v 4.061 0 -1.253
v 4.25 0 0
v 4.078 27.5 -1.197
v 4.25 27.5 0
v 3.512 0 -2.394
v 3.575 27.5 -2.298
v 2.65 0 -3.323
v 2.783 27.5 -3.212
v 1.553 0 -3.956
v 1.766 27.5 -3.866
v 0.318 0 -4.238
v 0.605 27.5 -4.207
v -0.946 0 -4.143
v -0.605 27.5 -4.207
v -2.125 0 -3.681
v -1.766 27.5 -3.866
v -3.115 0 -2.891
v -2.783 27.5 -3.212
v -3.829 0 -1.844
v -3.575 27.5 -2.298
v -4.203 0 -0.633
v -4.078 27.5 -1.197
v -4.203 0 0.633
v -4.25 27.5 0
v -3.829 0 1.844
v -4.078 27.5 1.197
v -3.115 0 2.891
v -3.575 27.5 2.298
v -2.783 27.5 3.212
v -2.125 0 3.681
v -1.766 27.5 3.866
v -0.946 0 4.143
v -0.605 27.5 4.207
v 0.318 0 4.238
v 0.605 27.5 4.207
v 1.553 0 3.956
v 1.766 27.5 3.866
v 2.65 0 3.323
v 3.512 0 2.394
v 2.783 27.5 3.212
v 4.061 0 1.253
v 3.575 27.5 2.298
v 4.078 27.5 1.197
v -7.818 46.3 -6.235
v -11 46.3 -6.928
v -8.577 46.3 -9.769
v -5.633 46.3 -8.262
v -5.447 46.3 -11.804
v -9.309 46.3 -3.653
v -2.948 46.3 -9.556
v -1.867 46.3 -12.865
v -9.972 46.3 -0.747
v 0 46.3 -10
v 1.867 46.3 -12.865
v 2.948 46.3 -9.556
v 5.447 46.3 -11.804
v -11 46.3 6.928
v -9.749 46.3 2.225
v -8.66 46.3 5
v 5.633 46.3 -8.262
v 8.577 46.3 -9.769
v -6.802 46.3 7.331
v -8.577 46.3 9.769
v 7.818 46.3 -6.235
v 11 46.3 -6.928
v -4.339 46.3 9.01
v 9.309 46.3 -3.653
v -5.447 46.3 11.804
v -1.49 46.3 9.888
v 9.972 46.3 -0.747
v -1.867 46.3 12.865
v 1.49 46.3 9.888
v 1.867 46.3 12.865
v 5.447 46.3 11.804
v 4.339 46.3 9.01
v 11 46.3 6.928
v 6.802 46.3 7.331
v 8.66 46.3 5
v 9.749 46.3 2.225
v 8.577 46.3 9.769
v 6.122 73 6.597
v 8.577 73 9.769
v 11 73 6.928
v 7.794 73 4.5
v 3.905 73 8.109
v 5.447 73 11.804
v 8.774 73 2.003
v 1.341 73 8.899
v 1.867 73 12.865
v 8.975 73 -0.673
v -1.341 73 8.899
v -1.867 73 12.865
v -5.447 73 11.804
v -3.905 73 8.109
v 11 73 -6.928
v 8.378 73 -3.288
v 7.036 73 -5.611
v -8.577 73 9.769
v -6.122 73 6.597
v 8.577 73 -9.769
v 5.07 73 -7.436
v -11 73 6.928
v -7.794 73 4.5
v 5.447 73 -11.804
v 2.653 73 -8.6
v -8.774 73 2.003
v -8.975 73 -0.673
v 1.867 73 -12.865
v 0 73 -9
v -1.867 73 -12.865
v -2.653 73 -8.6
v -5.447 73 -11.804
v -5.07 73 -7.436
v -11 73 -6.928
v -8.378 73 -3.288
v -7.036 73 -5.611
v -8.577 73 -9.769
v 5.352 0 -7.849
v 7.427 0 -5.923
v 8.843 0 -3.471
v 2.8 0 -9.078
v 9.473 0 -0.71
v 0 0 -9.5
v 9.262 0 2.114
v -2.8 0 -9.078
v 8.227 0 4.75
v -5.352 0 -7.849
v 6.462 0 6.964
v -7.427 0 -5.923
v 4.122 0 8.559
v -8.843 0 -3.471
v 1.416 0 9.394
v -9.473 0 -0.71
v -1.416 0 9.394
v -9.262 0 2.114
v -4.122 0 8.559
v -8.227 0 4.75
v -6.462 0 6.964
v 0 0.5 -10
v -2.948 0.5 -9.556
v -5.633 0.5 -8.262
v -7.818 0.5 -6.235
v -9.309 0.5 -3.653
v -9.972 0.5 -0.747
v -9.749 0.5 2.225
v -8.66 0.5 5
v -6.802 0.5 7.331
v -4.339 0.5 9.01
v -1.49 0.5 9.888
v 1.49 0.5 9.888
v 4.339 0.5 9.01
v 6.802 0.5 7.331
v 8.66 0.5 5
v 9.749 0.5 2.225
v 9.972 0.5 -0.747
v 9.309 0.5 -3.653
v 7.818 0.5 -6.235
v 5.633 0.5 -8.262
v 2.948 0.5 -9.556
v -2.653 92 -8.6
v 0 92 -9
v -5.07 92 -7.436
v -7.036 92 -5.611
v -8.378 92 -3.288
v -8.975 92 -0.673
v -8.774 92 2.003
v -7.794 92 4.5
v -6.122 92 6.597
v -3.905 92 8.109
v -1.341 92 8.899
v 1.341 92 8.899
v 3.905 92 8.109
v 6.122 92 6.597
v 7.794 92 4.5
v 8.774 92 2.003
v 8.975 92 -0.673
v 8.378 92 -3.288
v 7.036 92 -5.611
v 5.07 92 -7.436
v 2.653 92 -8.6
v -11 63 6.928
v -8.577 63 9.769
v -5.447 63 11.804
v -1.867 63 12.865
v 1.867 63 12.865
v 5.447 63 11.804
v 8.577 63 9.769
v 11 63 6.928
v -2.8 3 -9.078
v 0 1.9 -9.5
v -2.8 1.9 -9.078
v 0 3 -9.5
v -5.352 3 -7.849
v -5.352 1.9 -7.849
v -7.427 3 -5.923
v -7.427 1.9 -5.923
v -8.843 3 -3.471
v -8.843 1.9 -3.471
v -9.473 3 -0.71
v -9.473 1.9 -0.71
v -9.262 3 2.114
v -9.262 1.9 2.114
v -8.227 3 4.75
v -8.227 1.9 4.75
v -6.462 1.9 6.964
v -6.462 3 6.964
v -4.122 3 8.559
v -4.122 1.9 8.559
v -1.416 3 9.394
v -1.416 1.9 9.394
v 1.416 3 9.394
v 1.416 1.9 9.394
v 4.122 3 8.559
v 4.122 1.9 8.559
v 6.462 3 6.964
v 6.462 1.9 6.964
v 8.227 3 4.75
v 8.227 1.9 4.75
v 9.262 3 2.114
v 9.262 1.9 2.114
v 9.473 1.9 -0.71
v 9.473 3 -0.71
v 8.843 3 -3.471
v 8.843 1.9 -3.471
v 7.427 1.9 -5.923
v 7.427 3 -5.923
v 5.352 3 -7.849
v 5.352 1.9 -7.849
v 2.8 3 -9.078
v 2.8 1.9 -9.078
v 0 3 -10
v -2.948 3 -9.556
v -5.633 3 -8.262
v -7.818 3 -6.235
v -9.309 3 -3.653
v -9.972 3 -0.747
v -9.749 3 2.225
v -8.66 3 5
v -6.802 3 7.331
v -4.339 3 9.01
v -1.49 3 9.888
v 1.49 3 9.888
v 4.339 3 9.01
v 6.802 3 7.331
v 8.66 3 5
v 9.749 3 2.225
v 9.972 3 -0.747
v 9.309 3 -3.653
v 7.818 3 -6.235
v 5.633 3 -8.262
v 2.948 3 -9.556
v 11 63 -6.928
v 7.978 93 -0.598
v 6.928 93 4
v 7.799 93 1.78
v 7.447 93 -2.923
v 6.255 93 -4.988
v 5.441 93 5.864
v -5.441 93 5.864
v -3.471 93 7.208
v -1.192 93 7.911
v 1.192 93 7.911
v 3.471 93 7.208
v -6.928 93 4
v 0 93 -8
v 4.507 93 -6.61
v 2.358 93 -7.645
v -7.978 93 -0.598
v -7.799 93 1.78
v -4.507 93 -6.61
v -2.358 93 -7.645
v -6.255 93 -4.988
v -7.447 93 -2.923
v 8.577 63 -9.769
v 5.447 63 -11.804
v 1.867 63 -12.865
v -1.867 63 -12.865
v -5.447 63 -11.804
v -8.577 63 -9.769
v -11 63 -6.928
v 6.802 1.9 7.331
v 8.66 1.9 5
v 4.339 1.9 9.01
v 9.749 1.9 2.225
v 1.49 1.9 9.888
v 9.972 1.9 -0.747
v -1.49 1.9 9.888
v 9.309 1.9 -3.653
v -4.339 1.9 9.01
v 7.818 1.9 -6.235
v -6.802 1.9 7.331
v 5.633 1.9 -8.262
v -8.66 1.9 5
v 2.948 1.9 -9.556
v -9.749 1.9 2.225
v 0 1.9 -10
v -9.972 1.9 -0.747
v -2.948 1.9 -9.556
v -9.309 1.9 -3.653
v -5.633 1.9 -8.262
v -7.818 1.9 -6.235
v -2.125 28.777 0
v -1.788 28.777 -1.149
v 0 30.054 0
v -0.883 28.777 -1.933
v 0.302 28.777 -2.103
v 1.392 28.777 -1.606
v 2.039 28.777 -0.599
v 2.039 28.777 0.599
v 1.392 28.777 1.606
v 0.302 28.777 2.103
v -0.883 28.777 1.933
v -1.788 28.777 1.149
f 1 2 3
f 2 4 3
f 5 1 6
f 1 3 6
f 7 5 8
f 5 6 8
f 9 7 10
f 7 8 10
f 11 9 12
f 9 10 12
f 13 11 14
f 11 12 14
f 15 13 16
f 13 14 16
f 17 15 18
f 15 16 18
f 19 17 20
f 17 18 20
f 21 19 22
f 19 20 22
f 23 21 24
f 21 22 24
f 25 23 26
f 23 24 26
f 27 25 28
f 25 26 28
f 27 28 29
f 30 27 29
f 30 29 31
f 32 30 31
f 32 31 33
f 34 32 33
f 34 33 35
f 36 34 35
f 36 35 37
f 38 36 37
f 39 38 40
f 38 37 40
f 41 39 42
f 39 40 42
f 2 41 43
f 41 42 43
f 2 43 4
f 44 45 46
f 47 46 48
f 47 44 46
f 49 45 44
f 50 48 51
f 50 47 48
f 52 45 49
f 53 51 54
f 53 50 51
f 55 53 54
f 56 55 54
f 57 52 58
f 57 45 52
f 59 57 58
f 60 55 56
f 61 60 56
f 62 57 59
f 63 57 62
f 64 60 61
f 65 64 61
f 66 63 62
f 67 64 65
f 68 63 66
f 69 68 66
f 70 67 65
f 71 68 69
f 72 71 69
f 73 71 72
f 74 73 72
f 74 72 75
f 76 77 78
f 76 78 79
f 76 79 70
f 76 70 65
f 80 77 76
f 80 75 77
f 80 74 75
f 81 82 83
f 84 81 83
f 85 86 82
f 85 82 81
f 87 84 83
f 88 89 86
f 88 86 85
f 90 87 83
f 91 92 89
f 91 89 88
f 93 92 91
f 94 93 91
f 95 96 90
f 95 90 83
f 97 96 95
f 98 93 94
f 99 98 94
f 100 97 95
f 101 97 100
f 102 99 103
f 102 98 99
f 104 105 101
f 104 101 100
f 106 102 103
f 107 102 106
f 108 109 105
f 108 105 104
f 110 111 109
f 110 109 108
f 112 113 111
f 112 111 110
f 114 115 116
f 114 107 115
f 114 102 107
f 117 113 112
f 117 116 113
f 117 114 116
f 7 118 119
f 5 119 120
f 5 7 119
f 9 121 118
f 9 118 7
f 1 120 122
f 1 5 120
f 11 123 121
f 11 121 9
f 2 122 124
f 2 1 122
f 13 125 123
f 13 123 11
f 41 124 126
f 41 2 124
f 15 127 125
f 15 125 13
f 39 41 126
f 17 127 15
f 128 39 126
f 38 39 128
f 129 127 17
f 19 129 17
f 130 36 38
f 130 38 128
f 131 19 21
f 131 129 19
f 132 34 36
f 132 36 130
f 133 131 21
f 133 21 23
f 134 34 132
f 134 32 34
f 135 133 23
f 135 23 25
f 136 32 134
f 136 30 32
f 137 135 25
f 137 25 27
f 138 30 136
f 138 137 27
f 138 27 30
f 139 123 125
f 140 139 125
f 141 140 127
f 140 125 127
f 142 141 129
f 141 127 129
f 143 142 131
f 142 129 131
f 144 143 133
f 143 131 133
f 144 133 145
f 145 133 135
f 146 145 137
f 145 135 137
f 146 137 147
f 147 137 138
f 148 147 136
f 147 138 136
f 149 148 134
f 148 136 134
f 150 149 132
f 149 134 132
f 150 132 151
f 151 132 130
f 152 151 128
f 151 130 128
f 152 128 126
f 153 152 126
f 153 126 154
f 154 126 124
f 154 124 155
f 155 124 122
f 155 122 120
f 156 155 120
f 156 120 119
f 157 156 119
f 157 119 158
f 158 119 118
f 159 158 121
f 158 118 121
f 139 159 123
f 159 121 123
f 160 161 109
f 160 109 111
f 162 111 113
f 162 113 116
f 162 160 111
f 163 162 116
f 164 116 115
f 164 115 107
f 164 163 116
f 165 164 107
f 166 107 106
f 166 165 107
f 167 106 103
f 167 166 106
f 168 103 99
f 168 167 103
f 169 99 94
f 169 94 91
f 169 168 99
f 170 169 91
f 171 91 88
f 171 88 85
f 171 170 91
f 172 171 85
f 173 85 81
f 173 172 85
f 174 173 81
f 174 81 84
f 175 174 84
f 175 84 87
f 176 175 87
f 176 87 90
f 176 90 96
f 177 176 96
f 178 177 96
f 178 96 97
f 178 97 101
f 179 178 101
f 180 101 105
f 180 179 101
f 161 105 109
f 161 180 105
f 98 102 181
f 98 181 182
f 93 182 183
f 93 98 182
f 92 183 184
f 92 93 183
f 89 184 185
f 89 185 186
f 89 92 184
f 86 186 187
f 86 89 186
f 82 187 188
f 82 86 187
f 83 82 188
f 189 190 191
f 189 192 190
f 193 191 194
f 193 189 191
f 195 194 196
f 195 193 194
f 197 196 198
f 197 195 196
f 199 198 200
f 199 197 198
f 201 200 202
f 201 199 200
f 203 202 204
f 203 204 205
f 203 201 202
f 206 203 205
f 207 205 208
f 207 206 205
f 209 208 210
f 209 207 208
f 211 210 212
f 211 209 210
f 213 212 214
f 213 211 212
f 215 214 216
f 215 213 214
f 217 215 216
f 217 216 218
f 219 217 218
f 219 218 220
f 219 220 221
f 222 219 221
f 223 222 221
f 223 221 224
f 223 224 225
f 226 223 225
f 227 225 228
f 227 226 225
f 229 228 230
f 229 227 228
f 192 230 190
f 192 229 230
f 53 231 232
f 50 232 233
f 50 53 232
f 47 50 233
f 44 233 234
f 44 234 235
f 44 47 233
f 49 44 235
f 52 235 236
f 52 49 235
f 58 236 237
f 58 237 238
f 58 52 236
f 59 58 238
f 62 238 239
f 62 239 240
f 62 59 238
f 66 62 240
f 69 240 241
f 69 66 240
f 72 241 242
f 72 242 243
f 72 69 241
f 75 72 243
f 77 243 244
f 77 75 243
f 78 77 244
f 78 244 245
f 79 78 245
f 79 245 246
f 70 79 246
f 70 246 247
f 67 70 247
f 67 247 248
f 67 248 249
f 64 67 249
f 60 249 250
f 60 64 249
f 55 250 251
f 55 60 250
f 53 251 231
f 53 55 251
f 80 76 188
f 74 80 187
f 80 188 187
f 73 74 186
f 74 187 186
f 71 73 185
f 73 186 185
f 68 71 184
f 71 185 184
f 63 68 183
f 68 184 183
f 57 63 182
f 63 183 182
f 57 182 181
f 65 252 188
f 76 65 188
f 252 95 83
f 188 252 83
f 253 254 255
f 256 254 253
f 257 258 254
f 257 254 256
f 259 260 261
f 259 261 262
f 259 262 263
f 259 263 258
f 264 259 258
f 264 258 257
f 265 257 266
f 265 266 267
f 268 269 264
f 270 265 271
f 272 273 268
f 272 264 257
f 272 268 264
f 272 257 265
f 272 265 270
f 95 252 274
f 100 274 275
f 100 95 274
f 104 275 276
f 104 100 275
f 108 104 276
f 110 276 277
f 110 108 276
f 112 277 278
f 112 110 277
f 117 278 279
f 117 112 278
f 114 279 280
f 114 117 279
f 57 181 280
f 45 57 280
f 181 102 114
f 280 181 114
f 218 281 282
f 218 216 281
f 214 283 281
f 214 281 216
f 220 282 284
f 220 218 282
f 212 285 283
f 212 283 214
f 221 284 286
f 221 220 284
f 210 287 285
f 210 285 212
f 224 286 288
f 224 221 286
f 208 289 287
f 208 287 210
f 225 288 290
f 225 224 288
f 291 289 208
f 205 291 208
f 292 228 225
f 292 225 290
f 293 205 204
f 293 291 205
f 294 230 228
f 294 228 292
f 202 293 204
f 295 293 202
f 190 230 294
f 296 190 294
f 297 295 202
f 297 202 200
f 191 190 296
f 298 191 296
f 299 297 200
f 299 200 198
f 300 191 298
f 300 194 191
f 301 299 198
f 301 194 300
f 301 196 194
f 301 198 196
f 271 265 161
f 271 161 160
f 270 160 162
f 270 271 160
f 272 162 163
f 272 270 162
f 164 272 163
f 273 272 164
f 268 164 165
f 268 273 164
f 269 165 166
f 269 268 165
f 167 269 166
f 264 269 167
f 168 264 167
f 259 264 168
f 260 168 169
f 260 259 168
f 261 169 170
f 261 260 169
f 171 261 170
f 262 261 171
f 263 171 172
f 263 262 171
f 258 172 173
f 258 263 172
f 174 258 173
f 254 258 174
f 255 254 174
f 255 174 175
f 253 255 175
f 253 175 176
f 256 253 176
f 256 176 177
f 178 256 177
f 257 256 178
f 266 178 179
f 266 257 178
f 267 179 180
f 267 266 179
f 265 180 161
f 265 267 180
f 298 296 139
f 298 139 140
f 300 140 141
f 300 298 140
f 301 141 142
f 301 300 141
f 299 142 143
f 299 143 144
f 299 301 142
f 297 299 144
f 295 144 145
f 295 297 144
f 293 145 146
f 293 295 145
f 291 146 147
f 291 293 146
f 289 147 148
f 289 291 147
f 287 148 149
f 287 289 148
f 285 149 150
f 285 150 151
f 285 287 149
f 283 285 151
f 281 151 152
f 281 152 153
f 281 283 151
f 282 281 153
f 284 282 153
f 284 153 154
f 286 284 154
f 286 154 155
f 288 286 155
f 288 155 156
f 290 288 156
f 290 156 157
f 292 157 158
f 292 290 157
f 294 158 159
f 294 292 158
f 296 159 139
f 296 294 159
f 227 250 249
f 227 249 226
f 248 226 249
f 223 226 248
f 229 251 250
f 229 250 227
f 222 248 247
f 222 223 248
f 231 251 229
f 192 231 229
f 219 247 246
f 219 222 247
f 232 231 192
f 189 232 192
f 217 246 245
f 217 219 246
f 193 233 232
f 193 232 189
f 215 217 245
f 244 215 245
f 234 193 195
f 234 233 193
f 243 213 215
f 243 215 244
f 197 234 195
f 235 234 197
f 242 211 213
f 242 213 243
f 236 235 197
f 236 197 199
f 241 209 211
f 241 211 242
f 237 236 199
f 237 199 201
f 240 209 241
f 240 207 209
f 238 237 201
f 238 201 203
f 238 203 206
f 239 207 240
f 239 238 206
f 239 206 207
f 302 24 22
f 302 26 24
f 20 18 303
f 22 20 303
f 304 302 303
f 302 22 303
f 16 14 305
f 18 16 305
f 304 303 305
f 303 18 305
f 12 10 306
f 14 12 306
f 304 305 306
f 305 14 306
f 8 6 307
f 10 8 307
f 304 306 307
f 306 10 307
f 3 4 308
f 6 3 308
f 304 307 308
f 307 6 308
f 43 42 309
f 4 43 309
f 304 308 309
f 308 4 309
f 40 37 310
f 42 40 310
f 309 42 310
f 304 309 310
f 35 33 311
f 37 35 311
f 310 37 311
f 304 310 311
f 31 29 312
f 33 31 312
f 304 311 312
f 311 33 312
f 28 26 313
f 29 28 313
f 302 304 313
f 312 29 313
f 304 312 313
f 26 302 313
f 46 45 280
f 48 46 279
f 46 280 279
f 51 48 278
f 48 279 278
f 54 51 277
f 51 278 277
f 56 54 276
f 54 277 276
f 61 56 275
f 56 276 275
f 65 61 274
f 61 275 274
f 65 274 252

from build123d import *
from build123d.topology import SkipClean

# Parameters (mm, degrees)
CHAMFER_1_SIZE          = 1
CUT_EXTRUDE_1_DEPTH     = 76.279479276
EXTRUDE_2_DEPTH         = 16.7
HOLE_WIZARD_M10_1_D     = 8.5
HOLE_WIZARD_M10_1_DEPTH = 27.5
HOLE_WIZARD_M10_1_TIP   = 2.553657631
CHAMFER_2_SIZE          = 0.5


with BuildPart() as part:
    # 草图1 → 旋转1 (revolve)
    with BuildSketch(Plane.XY, mode=Mode.PRIVATE) as revolve_1_sk:
        Polygon((0, 0), (10, 0), (10, 1.9), (9.5, 1.9), (9.5, 3), (10, 3), (10, 63), (13, 63), (13, 73), (9, 73), (9, 93), (0, 93), align=None)
    revolve(revolve_1_sk.sketch.rotate(Axis((0, 0, 0), (0, 1, 0)), 90), axis=Axis((0, 0, 0), (0, 1, 0)))

    # 倒角1
    chamfer_1_edges = [part.edges().sort_by_distance(p)[0] for p in [
        (0, 93, 9),
    ]]
    chamfer(chamfer_1_edges, length=CHAMFER_1_SIZE)

    # 草图2 → 切除-拉伸1 (cut, through all)
    with BuildSketch(Plane(origin=(0, 73, 0), x_dir=(1, 0, 0), z_dir=(0, 1, 0))):
        with BuildLine():
            Line((-11, -6.92820323), (-11, 6.92820323))
            ThreePointArc((-11, 6.92820323), (-13, 0), (-11, -6.92820323))
        make_face()
        with BuildLine():
            ThreePointArc((13, 0), (12.489995997, 3.605551275), (11, 6.92820323))
            Line((11, 6.92820323), (11, -6.92820323))
            ThreePointArc((11, -6.92820323), (12.489995997, -3.605551275), (13, 0))
        make_face()
    extrude(amount=-CUT_EXTRUDE_1_DEPTH, mode=Mode.SUBTRACT)

    # 草图6 → 凸台-拉伸2 (add)
    with SkipClean():  # the faces are left unmerged after this step: merging them gives an invalid solid
        with BuildSketch(Plane.XZ.offset(-63)):
            with BuildLine():
                Line((11, -6.92820323), (11, 6.92820323))
                ThreePointArc((11, 6.92820323), (0, 13), (-11, 6.92820323))
                Line((-11, 6.92820323), (-11, -6.92820323))
                ThreePointArc((-11, -6.92820323), (0, -13), (11, -6.92820323))
            make_face()
        extrude(amount=EXTRUDE_2_DEPTH)

    # M10 螺纹孔1
    with Locations(Plane(origin=(0, 0, 0), x_dir=(-1, 0, 0), z_dir=(0, -1, 0))):
        with Locations((0, 0)):
            Hole(HOLE_WIZARD_M10_1_D / 2, depth=HOLE_WIZARD_M10_1_DEPTH)
            with Locations((0, 0, -(HOLE_WIZARD_M10_1_DEPTH + HOLE_WIZARD_M10_1_TIP / 2))):  # 118° drill point
                Cone(0, HOLE_WIZARD_M10_1_D / 2, HOLE_WIZARD_M10_1_TIP, mode=Mode.SUBTRACT)

    # 倒角2
    chamfer_2_edges = [part.edges().sort_by_distance(p)[0] for p in [
        (0, 0, 10),
    ]]
    chamfer(chamfer_2_edges, length=CHAMFER_2_SIZE)


solid = part.part
